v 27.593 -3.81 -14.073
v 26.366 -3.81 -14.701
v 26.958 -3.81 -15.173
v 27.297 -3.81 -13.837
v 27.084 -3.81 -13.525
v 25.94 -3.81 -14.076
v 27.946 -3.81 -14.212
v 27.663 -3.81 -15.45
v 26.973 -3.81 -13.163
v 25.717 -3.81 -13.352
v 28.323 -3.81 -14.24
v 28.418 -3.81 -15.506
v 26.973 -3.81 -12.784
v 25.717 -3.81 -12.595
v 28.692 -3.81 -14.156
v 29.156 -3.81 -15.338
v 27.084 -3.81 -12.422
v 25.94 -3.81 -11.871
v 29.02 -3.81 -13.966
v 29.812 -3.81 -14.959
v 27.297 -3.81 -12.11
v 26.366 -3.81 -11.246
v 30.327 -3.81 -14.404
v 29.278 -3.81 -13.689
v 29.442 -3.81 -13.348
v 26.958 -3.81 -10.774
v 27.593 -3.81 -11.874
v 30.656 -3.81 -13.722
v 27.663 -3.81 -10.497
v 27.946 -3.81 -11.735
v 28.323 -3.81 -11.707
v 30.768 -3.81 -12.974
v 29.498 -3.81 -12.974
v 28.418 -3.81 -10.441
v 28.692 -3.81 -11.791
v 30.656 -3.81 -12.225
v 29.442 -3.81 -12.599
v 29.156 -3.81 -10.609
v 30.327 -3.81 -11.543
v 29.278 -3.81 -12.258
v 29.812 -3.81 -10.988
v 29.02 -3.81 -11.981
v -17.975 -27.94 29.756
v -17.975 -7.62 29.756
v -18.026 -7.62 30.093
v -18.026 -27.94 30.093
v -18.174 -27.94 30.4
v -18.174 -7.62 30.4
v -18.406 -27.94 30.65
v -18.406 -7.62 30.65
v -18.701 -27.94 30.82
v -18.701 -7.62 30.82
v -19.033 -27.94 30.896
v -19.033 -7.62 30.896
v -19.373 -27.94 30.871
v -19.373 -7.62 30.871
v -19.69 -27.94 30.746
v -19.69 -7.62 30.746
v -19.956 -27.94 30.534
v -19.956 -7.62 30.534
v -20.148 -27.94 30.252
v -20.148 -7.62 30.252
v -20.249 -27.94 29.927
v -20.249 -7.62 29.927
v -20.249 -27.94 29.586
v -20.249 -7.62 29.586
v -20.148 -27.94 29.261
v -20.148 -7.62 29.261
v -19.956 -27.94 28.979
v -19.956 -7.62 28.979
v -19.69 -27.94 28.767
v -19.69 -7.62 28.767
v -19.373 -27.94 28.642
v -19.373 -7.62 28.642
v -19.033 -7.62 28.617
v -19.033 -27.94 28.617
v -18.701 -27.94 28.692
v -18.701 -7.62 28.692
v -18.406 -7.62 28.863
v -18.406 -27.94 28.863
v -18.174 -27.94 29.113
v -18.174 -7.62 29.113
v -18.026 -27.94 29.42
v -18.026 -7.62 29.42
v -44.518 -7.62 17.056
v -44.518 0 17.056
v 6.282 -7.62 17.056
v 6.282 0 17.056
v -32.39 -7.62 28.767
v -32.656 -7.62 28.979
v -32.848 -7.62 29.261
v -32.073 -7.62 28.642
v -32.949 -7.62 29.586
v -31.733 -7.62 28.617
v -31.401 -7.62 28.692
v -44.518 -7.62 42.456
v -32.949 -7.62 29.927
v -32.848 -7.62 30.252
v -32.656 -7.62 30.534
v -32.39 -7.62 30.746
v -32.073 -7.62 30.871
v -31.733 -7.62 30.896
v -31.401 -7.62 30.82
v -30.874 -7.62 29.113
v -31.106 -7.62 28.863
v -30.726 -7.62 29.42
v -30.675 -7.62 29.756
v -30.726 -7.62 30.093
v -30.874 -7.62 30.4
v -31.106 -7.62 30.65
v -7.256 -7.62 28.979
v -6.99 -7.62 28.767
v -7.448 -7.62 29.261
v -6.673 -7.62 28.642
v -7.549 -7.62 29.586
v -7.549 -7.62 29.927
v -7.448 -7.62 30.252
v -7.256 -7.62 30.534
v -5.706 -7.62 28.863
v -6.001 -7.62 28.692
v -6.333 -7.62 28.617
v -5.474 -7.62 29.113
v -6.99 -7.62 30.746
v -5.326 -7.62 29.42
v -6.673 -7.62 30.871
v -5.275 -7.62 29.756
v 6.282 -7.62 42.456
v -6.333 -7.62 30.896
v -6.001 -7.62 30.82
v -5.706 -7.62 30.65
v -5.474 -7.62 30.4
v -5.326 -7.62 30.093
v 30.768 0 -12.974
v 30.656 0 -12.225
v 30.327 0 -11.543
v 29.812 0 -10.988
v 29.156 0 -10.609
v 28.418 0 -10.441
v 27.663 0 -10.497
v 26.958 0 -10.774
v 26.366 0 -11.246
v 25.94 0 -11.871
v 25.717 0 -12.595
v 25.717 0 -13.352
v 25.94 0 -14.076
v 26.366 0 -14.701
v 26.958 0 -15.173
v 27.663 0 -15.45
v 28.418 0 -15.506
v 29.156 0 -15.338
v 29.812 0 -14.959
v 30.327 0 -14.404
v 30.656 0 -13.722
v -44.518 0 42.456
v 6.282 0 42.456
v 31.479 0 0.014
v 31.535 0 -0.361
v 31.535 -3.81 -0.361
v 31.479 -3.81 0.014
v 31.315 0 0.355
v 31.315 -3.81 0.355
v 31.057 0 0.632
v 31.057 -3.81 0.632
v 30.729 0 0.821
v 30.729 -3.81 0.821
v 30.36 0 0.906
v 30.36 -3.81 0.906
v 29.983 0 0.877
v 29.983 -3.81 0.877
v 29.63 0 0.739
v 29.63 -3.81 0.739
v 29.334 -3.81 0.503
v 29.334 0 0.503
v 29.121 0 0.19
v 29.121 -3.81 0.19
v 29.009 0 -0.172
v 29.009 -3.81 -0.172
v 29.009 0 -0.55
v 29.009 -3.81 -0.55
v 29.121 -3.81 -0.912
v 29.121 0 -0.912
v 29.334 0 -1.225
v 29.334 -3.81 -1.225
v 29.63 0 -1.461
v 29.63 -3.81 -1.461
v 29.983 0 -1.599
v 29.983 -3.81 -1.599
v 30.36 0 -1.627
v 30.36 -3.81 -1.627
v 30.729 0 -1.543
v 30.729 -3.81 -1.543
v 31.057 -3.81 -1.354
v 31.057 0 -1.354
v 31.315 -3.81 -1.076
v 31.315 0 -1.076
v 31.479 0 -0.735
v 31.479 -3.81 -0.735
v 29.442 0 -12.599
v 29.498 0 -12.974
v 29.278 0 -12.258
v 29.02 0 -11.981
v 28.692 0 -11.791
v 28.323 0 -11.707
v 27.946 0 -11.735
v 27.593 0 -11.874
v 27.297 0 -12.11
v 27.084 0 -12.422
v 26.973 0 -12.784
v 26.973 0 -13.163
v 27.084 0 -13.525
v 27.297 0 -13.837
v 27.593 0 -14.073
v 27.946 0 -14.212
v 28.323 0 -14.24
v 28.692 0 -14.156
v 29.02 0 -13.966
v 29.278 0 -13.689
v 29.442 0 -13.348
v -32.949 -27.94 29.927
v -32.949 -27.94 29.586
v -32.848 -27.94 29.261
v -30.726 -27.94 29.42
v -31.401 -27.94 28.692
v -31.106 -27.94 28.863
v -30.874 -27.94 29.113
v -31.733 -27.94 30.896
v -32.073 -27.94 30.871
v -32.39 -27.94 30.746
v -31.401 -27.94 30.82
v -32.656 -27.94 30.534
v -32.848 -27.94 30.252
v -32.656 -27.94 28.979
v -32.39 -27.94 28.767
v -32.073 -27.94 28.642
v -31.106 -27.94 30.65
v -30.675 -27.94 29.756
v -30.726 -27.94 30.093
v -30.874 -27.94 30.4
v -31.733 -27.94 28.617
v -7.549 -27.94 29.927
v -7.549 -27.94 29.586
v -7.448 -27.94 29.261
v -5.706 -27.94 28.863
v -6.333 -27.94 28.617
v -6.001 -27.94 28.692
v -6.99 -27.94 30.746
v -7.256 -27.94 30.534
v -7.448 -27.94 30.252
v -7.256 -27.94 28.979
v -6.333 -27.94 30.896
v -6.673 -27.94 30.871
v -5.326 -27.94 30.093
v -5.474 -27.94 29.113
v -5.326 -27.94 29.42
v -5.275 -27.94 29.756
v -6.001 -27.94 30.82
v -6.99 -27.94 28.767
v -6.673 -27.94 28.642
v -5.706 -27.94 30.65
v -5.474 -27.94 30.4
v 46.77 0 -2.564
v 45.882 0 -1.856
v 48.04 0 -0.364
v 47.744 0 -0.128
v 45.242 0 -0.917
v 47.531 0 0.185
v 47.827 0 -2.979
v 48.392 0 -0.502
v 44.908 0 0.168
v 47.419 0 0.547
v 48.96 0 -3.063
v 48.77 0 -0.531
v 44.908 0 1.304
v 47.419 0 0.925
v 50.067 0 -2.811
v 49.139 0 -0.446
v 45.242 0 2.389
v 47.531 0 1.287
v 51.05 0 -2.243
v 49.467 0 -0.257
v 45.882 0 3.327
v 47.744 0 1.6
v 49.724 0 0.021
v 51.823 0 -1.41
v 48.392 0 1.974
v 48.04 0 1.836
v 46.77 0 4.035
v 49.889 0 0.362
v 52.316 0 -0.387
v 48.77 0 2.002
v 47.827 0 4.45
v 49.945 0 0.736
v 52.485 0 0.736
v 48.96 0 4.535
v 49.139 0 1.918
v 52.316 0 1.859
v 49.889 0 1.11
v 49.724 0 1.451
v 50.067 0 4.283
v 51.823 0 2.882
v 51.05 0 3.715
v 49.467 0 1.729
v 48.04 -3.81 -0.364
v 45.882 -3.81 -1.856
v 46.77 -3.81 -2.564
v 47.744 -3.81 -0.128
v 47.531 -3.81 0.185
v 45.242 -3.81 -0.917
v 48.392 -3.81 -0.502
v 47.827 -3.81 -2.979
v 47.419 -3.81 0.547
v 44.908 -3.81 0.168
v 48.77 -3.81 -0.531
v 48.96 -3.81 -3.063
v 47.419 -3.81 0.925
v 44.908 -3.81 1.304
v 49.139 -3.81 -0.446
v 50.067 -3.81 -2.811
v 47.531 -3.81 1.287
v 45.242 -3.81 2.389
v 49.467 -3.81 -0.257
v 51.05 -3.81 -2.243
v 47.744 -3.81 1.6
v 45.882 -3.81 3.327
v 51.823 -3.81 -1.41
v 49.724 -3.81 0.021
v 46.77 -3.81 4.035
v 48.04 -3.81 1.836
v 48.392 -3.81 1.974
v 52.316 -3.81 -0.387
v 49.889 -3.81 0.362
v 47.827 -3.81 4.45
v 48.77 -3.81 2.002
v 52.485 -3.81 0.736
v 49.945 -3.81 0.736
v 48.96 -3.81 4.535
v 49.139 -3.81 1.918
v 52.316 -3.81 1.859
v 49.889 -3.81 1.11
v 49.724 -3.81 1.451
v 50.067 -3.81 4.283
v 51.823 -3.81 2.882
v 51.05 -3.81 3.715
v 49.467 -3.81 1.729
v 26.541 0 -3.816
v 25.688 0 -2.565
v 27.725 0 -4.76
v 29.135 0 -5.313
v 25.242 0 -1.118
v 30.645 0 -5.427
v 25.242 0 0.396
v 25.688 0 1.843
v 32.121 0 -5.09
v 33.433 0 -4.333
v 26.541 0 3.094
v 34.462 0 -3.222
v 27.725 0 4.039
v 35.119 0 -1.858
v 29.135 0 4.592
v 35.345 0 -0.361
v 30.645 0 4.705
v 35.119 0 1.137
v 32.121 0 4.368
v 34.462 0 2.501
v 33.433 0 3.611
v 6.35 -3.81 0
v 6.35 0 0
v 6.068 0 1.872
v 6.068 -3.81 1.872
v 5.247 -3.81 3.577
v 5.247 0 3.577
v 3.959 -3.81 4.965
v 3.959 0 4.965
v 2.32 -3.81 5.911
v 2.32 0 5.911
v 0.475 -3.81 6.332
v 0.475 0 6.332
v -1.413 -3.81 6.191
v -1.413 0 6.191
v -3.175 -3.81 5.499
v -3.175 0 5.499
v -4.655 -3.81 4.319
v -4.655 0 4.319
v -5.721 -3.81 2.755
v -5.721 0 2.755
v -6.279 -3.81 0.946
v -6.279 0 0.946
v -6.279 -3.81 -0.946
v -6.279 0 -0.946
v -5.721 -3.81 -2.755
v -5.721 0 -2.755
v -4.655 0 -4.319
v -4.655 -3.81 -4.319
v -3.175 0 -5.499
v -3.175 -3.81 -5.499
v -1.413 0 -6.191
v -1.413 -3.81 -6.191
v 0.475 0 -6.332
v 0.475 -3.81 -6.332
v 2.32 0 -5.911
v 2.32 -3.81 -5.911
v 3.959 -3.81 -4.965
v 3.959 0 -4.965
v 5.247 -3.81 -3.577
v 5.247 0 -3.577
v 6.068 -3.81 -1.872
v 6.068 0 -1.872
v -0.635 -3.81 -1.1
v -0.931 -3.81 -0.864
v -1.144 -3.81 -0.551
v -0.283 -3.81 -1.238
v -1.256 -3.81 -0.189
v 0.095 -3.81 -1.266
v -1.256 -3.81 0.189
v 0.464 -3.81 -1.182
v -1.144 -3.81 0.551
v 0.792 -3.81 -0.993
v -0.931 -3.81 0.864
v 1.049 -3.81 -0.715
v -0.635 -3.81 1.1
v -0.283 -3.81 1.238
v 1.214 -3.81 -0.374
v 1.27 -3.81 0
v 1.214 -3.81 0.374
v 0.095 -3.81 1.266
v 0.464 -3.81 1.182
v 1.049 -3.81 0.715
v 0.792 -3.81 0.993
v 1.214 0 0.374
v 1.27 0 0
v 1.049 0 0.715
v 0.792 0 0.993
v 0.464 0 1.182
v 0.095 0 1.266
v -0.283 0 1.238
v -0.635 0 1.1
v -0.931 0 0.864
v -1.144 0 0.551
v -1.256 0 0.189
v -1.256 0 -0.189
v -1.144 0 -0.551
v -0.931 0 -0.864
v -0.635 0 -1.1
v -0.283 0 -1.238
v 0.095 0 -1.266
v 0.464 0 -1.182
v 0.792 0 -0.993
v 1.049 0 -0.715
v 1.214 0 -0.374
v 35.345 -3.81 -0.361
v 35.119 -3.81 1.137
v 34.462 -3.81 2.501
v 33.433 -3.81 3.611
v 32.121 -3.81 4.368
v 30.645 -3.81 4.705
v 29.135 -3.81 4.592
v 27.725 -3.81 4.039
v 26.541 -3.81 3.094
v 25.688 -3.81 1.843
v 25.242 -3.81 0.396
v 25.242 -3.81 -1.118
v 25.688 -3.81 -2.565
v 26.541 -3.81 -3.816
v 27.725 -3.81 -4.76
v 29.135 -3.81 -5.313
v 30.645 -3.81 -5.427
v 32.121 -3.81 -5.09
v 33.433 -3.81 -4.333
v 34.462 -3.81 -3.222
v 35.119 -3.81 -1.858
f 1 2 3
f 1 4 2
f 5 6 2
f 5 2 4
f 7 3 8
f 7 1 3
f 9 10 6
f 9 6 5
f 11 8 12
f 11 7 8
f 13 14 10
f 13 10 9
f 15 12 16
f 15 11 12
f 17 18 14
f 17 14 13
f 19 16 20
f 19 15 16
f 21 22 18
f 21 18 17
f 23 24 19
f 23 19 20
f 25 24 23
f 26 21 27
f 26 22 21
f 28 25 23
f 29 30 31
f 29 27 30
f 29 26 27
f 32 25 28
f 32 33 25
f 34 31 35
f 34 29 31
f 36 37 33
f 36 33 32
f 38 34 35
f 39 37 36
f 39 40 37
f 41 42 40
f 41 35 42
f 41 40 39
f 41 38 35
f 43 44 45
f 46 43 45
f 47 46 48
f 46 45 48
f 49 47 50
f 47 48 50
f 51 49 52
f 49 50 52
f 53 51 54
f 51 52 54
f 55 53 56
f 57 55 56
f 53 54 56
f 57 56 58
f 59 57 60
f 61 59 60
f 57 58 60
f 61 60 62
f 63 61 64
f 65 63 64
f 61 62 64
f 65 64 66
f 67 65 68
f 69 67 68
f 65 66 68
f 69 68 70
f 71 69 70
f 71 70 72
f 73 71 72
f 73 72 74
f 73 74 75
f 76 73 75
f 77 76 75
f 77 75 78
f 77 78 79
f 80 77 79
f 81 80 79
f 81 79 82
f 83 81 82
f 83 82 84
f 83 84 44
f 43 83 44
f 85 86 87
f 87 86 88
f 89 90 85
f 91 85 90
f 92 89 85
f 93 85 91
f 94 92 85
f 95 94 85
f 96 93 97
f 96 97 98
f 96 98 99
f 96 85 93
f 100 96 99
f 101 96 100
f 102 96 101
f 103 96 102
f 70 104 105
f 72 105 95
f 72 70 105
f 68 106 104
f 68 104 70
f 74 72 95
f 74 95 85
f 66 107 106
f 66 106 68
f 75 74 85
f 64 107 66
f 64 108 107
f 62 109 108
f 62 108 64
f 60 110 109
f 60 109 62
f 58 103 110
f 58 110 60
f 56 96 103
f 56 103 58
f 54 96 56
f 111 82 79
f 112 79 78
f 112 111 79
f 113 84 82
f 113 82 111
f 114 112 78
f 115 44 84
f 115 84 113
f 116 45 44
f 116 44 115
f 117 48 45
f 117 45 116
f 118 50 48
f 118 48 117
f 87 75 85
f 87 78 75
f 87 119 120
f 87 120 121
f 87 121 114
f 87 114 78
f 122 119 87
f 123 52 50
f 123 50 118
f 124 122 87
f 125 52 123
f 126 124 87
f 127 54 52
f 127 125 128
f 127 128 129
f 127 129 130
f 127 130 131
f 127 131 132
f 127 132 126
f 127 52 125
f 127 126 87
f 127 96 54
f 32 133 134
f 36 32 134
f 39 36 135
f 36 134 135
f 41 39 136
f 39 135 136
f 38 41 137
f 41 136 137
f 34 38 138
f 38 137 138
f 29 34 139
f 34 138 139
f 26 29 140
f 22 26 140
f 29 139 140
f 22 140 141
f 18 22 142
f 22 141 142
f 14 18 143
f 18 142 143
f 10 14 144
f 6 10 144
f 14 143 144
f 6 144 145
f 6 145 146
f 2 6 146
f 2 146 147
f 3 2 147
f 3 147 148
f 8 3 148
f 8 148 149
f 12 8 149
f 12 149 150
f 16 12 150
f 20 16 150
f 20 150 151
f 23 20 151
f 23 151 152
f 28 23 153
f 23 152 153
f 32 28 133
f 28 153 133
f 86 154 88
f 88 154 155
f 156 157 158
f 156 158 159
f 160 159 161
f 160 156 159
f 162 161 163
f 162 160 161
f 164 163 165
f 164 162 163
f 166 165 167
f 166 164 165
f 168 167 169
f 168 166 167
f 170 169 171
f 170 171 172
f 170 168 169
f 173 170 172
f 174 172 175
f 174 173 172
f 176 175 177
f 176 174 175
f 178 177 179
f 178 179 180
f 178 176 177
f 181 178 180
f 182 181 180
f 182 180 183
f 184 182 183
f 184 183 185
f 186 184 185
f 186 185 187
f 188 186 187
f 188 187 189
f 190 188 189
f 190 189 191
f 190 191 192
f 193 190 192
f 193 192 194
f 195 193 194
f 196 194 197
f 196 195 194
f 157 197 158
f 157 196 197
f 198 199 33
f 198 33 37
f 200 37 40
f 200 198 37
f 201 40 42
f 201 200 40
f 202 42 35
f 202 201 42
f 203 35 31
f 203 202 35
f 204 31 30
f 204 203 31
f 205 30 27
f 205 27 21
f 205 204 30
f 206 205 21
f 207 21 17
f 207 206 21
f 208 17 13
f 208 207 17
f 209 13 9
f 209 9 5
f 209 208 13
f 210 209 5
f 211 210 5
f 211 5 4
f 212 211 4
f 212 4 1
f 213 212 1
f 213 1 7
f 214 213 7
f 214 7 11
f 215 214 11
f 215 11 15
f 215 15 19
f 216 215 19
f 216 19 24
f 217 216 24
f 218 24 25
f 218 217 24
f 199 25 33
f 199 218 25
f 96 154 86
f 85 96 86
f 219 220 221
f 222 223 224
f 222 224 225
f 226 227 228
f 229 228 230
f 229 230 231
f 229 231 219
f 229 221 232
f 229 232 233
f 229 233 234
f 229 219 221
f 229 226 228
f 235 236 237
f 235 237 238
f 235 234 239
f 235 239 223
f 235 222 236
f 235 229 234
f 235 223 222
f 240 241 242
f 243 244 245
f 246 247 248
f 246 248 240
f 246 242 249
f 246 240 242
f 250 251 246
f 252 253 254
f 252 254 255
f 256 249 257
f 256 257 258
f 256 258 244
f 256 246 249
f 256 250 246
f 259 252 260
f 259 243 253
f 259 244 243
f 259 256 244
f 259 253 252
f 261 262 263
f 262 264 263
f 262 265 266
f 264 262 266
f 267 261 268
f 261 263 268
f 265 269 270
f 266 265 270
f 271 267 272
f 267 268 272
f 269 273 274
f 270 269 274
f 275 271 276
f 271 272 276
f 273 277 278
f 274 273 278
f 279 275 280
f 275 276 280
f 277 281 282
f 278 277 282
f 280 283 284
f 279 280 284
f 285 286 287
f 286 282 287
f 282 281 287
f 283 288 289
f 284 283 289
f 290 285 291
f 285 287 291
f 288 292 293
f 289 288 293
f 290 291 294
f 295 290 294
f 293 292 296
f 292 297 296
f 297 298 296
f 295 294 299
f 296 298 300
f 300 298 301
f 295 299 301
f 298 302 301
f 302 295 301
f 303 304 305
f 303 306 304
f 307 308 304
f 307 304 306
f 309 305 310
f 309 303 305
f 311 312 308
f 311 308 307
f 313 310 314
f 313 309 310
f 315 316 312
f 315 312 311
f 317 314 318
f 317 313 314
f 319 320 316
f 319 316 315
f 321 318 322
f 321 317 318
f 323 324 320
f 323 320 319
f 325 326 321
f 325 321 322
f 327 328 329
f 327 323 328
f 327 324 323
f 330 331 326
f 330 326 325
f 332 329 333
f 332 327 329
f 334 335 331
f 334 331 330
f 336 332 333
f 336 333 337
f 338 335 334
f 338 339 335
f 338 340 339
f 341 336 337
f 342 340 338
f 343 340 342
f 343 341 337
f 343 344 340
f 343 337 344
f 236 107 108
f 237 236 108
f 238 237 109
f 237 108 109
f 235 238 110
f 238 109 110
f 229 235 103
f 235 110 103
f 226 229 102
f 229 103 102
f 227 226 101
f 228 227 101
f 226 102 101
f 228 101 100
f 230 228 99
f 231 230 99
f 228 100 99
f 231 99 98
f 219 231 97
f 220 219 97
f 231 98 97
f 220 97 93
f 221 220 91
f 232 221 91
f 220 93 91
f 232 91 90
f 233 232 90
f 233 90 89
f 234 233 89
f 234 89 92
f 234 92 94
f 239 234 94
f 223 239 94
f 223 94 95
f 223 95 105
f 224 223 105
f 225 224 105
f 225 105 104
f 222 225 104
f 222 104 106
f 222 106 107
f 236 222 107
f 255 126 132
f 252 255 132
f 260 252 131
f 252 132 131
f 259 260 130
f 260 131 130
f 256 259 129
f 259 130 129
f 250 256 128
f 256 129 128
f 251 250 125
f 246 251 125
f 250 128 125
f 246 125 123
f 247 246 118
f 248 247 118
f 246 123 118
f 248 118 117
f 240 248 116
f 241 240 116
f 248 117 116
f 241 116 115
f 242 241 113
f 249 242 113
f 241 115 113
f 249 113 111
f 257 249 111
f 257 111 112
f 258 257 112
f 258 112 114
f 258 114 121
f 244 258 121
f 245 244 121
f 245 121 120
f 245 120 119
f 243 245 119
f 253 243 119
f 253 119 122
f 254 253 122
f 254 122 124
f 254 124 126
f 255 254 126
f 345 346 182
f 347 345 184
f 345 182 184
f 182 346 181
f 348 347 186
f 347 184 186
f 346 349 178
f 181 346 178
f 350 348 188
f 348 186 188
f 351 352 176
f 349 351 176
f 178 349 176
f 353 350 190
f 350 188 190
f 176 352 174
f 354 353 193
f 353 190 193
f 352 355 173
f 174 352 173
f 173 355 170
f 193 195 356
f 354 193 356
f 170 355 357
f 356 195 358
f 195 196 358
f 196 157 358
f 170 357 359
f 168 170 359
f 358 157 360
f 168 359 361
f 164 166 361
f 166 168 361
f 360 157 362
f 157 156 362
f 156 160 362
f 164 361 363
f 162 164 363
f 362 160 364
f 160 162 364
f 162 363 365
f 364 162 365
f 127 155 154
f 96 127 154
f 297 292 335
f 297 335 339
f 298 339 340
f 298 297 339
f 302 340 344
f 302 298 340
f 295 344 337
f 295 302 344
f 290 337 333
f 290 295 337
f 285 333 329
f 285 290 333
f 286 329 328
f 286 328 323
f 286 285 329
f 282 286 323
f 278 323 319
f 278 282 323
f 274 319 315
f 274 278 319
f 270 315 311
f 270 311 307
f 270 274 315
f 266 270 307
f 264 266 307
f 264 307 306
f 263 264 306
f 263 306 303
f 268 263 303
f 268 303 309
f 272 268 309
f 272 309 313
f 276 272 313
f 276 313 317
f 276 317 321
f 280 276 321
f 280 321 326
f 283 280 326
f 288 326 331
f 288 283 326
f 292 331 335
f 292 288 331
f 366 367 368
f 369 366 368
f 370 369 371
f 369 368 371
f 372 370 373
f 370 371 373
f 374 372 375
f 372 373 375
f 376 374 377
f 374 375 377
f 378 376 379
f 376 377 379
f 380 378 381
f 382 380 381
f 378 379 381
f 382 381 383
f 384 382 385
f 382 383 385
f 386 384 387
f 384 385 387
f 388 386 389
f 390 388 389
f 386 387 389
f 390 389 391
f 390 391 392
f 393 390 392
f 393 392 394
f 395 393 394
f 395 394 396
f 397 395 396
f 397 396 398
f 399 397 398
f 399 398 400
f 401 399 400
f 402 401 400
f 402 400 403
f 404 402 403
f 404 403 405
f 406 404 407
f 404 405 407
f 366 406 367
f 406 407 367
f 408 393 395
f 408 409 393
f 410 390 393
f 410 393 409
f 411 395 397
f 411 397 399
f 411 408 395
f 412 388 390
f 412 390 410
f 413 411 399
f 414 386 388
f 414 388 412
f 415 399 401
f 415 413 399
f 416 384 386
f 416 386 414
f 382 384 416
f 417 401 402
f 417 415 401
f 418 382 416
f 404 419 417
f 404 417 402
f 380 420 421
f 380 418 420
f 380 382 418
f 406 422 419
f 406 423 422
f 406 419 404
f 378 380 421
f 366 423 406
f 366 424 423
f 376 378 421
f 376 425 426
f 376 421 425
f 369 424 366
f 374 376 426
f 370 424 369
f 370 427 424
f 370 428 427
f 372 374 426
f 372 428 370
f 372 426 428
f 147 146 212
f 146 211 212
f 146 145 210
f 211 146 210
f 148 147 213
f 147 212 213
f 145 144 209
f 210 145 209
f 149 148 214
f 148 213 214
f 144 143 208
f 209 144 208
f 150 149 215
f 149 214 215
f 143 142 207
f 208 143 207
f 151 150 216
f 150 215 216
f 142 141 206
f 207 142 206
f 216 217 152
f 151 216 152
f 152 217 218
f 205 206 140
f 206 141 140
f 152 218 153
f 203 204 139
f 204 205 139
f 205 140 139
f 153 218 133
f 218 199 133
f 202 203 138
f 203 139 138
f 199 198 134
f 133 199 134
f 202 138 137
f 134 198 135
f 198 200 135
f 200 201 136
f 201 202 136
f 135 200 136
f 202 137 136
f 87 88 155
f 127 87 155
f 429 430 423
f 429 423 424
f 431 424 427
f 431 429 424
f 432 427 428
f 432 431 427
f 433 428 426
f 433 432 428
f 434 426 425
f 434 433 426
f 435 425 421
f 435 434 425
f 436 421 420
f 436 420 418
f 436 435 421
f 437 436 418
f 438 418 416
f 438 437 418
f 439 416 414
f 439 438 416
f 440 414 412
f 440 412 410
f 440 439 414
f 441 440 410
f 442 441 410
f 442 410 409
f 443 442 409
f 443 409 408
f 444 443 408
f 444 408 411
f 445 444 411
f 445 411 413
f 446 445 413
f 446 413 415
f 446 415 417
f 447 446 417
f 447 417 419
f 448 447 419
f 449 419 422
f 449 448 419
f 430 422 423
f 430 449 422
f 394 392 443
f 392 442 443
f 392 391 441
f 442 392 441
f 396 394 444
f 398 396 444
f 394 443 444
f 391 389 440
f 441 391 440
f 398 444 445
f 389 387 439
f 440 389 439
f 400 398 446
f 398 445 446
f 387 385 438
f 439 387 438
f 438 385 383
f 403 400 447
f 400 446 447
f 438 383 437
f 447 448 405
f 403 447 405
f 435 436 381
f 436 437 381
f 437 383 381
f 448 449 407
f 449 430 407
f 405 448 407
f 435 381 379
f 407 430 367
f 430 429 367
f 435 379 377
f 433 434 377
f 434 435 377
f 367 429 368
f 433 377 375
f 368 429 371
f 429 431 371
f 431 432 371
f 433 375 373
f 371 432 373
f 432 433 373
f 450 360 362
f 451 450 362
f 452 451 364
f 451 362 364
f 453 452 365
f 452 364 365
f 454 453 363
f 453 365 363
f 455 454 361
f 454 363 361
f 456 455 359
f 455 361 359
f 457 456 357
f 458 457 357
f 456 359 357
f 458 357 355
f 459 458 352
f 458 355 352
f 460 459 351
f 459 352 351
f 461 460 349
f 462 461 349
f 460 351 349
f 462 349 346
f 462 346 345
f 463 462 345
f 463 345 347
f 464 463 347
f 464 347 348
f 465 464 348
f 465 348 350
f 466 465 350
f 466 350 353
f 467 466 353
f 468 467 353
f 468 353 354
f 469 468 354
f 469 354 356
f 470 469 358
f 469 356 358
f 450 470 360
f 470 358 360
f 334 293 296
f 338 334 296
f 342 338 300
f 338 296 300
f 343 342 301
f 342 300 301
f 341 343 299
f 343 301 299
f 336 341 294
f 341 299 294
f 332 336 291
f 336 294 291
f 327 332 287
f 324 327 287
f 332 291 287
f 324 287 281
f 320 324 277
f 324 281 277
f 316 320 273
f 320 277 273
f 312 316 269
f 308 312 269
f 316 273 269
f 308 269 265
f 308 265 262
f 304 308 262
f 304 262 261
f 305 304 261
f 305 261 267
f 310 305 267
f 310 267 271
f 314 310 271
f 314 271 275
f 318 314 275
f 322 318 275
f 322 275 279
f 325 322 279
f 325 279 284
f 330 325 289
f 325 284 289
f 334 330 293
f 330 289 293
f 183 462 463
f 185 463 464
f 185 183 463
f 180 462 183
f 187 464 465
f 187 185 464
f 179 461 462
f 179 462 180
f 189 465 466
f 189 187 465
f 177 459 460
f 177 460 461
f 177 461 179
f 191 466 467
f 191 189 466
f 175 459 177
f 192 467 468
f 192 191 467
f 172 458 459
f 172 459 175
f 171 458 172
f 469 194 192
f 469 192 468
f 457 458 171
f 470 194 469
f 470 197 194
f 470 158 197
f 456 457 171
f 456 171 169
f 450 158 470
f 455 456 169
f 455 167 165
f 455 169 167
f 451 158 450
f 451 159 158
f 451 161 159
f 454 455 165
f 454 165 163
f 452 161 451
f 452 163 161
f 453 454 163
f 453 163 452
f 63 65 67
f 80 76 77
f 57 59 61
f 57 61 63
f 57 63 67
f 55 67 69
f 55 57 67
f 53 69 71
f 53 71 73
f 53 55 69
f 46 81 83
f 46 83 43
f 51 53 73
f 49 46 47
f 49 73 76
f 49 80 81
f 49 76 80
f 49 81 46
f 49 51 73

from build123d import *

# Parameters (mm, degrees)
F0_R     = 1.143
F1_DEPTH = 7.62
F0_R_2   = 3.81
F0_R_3   = 1.27
F0_R_4   = 5.08
F0_R_5   = 6.35
F0_R_6   = 2.54
F2_DEPTH = 3.81
F3_DEPTH = 27.94


with BuildPart() as f1:
    # F0 (on Front) → F1 (new body)
    with BuildSketch(Plane.XZ):
        Polygon((-44.518456, 42.456474), (-44.518456, 17.056474), (-31.818456, 17.056474), (-6.418456, 17.056474), (6.281544, 17.056474), (6.281544, 42.456474), align=None)
        with Locations((-31.818456, 29.756474)):
            Circle(F0_R, mode=Mode.SUBTRACT)
        with Locations((-19.118456, 29.756474)):
            Circle(F0_R, mode=Mode.SUBTRACT)
        with Locations((-6.418456, 29.756474)):
            Circle(F0_R, mode=Mode.SUBTRACT)
        with Locations((-6.418456, 29.756474)):
            Circle(F0_R)
        with Locations((-19.118456, 29.756474)):
            Circle(F0_R)
        with Locations((-31.818456, 29.756474)):
            Circle(F0_R)
    extrude(amount=F1_DEPTH)

    # F0 (on Front) → F3 (join)
    with BuildSketch(Plane.XZ):
        with Locations((-6.418456, 29.756474)):
            Circle(F0_R)
        with Locations((-19.118456, 29.756474)):
            Circle(F0_R)
        with Locations((-31.818456, 29.756474)):
            Circle(F0_R)
    extrude(amount=F3_DEPTH)


with BuildPart() as f2:
    # F0 (on Front) → F2 (new body)
    with BuildSketch(Plane.XZ):
        with Locations((48.674997, 0.735924)):
            Circle(F0_R_2)
        with Locations((48.674997, 0.735924)):
            Circle(F0_R_3, mode=Mode.SUBTRACT)
        with Locations((30.26519, -0.36083)):
            Circle(F0_R_4)
        with Locations((30.26519, -0.36083)):
            Circle(F0_R_3, mode=Mode.SUBTRACT)
        Circle(F0_R_5)
        Circle(F0_R_3, mode=Mode.SUBTRACT)
        with Locations((28.228359, -12.973508)):
            Circle(F0_R_6)
        with Locations((28.228359, -12.973508)):
            Circle(F0_R_3, mode=Mode.SUBTRACT)
    extrude(amount=F2_DEPTH)


solid = Compound([f1.part, f2.part])
